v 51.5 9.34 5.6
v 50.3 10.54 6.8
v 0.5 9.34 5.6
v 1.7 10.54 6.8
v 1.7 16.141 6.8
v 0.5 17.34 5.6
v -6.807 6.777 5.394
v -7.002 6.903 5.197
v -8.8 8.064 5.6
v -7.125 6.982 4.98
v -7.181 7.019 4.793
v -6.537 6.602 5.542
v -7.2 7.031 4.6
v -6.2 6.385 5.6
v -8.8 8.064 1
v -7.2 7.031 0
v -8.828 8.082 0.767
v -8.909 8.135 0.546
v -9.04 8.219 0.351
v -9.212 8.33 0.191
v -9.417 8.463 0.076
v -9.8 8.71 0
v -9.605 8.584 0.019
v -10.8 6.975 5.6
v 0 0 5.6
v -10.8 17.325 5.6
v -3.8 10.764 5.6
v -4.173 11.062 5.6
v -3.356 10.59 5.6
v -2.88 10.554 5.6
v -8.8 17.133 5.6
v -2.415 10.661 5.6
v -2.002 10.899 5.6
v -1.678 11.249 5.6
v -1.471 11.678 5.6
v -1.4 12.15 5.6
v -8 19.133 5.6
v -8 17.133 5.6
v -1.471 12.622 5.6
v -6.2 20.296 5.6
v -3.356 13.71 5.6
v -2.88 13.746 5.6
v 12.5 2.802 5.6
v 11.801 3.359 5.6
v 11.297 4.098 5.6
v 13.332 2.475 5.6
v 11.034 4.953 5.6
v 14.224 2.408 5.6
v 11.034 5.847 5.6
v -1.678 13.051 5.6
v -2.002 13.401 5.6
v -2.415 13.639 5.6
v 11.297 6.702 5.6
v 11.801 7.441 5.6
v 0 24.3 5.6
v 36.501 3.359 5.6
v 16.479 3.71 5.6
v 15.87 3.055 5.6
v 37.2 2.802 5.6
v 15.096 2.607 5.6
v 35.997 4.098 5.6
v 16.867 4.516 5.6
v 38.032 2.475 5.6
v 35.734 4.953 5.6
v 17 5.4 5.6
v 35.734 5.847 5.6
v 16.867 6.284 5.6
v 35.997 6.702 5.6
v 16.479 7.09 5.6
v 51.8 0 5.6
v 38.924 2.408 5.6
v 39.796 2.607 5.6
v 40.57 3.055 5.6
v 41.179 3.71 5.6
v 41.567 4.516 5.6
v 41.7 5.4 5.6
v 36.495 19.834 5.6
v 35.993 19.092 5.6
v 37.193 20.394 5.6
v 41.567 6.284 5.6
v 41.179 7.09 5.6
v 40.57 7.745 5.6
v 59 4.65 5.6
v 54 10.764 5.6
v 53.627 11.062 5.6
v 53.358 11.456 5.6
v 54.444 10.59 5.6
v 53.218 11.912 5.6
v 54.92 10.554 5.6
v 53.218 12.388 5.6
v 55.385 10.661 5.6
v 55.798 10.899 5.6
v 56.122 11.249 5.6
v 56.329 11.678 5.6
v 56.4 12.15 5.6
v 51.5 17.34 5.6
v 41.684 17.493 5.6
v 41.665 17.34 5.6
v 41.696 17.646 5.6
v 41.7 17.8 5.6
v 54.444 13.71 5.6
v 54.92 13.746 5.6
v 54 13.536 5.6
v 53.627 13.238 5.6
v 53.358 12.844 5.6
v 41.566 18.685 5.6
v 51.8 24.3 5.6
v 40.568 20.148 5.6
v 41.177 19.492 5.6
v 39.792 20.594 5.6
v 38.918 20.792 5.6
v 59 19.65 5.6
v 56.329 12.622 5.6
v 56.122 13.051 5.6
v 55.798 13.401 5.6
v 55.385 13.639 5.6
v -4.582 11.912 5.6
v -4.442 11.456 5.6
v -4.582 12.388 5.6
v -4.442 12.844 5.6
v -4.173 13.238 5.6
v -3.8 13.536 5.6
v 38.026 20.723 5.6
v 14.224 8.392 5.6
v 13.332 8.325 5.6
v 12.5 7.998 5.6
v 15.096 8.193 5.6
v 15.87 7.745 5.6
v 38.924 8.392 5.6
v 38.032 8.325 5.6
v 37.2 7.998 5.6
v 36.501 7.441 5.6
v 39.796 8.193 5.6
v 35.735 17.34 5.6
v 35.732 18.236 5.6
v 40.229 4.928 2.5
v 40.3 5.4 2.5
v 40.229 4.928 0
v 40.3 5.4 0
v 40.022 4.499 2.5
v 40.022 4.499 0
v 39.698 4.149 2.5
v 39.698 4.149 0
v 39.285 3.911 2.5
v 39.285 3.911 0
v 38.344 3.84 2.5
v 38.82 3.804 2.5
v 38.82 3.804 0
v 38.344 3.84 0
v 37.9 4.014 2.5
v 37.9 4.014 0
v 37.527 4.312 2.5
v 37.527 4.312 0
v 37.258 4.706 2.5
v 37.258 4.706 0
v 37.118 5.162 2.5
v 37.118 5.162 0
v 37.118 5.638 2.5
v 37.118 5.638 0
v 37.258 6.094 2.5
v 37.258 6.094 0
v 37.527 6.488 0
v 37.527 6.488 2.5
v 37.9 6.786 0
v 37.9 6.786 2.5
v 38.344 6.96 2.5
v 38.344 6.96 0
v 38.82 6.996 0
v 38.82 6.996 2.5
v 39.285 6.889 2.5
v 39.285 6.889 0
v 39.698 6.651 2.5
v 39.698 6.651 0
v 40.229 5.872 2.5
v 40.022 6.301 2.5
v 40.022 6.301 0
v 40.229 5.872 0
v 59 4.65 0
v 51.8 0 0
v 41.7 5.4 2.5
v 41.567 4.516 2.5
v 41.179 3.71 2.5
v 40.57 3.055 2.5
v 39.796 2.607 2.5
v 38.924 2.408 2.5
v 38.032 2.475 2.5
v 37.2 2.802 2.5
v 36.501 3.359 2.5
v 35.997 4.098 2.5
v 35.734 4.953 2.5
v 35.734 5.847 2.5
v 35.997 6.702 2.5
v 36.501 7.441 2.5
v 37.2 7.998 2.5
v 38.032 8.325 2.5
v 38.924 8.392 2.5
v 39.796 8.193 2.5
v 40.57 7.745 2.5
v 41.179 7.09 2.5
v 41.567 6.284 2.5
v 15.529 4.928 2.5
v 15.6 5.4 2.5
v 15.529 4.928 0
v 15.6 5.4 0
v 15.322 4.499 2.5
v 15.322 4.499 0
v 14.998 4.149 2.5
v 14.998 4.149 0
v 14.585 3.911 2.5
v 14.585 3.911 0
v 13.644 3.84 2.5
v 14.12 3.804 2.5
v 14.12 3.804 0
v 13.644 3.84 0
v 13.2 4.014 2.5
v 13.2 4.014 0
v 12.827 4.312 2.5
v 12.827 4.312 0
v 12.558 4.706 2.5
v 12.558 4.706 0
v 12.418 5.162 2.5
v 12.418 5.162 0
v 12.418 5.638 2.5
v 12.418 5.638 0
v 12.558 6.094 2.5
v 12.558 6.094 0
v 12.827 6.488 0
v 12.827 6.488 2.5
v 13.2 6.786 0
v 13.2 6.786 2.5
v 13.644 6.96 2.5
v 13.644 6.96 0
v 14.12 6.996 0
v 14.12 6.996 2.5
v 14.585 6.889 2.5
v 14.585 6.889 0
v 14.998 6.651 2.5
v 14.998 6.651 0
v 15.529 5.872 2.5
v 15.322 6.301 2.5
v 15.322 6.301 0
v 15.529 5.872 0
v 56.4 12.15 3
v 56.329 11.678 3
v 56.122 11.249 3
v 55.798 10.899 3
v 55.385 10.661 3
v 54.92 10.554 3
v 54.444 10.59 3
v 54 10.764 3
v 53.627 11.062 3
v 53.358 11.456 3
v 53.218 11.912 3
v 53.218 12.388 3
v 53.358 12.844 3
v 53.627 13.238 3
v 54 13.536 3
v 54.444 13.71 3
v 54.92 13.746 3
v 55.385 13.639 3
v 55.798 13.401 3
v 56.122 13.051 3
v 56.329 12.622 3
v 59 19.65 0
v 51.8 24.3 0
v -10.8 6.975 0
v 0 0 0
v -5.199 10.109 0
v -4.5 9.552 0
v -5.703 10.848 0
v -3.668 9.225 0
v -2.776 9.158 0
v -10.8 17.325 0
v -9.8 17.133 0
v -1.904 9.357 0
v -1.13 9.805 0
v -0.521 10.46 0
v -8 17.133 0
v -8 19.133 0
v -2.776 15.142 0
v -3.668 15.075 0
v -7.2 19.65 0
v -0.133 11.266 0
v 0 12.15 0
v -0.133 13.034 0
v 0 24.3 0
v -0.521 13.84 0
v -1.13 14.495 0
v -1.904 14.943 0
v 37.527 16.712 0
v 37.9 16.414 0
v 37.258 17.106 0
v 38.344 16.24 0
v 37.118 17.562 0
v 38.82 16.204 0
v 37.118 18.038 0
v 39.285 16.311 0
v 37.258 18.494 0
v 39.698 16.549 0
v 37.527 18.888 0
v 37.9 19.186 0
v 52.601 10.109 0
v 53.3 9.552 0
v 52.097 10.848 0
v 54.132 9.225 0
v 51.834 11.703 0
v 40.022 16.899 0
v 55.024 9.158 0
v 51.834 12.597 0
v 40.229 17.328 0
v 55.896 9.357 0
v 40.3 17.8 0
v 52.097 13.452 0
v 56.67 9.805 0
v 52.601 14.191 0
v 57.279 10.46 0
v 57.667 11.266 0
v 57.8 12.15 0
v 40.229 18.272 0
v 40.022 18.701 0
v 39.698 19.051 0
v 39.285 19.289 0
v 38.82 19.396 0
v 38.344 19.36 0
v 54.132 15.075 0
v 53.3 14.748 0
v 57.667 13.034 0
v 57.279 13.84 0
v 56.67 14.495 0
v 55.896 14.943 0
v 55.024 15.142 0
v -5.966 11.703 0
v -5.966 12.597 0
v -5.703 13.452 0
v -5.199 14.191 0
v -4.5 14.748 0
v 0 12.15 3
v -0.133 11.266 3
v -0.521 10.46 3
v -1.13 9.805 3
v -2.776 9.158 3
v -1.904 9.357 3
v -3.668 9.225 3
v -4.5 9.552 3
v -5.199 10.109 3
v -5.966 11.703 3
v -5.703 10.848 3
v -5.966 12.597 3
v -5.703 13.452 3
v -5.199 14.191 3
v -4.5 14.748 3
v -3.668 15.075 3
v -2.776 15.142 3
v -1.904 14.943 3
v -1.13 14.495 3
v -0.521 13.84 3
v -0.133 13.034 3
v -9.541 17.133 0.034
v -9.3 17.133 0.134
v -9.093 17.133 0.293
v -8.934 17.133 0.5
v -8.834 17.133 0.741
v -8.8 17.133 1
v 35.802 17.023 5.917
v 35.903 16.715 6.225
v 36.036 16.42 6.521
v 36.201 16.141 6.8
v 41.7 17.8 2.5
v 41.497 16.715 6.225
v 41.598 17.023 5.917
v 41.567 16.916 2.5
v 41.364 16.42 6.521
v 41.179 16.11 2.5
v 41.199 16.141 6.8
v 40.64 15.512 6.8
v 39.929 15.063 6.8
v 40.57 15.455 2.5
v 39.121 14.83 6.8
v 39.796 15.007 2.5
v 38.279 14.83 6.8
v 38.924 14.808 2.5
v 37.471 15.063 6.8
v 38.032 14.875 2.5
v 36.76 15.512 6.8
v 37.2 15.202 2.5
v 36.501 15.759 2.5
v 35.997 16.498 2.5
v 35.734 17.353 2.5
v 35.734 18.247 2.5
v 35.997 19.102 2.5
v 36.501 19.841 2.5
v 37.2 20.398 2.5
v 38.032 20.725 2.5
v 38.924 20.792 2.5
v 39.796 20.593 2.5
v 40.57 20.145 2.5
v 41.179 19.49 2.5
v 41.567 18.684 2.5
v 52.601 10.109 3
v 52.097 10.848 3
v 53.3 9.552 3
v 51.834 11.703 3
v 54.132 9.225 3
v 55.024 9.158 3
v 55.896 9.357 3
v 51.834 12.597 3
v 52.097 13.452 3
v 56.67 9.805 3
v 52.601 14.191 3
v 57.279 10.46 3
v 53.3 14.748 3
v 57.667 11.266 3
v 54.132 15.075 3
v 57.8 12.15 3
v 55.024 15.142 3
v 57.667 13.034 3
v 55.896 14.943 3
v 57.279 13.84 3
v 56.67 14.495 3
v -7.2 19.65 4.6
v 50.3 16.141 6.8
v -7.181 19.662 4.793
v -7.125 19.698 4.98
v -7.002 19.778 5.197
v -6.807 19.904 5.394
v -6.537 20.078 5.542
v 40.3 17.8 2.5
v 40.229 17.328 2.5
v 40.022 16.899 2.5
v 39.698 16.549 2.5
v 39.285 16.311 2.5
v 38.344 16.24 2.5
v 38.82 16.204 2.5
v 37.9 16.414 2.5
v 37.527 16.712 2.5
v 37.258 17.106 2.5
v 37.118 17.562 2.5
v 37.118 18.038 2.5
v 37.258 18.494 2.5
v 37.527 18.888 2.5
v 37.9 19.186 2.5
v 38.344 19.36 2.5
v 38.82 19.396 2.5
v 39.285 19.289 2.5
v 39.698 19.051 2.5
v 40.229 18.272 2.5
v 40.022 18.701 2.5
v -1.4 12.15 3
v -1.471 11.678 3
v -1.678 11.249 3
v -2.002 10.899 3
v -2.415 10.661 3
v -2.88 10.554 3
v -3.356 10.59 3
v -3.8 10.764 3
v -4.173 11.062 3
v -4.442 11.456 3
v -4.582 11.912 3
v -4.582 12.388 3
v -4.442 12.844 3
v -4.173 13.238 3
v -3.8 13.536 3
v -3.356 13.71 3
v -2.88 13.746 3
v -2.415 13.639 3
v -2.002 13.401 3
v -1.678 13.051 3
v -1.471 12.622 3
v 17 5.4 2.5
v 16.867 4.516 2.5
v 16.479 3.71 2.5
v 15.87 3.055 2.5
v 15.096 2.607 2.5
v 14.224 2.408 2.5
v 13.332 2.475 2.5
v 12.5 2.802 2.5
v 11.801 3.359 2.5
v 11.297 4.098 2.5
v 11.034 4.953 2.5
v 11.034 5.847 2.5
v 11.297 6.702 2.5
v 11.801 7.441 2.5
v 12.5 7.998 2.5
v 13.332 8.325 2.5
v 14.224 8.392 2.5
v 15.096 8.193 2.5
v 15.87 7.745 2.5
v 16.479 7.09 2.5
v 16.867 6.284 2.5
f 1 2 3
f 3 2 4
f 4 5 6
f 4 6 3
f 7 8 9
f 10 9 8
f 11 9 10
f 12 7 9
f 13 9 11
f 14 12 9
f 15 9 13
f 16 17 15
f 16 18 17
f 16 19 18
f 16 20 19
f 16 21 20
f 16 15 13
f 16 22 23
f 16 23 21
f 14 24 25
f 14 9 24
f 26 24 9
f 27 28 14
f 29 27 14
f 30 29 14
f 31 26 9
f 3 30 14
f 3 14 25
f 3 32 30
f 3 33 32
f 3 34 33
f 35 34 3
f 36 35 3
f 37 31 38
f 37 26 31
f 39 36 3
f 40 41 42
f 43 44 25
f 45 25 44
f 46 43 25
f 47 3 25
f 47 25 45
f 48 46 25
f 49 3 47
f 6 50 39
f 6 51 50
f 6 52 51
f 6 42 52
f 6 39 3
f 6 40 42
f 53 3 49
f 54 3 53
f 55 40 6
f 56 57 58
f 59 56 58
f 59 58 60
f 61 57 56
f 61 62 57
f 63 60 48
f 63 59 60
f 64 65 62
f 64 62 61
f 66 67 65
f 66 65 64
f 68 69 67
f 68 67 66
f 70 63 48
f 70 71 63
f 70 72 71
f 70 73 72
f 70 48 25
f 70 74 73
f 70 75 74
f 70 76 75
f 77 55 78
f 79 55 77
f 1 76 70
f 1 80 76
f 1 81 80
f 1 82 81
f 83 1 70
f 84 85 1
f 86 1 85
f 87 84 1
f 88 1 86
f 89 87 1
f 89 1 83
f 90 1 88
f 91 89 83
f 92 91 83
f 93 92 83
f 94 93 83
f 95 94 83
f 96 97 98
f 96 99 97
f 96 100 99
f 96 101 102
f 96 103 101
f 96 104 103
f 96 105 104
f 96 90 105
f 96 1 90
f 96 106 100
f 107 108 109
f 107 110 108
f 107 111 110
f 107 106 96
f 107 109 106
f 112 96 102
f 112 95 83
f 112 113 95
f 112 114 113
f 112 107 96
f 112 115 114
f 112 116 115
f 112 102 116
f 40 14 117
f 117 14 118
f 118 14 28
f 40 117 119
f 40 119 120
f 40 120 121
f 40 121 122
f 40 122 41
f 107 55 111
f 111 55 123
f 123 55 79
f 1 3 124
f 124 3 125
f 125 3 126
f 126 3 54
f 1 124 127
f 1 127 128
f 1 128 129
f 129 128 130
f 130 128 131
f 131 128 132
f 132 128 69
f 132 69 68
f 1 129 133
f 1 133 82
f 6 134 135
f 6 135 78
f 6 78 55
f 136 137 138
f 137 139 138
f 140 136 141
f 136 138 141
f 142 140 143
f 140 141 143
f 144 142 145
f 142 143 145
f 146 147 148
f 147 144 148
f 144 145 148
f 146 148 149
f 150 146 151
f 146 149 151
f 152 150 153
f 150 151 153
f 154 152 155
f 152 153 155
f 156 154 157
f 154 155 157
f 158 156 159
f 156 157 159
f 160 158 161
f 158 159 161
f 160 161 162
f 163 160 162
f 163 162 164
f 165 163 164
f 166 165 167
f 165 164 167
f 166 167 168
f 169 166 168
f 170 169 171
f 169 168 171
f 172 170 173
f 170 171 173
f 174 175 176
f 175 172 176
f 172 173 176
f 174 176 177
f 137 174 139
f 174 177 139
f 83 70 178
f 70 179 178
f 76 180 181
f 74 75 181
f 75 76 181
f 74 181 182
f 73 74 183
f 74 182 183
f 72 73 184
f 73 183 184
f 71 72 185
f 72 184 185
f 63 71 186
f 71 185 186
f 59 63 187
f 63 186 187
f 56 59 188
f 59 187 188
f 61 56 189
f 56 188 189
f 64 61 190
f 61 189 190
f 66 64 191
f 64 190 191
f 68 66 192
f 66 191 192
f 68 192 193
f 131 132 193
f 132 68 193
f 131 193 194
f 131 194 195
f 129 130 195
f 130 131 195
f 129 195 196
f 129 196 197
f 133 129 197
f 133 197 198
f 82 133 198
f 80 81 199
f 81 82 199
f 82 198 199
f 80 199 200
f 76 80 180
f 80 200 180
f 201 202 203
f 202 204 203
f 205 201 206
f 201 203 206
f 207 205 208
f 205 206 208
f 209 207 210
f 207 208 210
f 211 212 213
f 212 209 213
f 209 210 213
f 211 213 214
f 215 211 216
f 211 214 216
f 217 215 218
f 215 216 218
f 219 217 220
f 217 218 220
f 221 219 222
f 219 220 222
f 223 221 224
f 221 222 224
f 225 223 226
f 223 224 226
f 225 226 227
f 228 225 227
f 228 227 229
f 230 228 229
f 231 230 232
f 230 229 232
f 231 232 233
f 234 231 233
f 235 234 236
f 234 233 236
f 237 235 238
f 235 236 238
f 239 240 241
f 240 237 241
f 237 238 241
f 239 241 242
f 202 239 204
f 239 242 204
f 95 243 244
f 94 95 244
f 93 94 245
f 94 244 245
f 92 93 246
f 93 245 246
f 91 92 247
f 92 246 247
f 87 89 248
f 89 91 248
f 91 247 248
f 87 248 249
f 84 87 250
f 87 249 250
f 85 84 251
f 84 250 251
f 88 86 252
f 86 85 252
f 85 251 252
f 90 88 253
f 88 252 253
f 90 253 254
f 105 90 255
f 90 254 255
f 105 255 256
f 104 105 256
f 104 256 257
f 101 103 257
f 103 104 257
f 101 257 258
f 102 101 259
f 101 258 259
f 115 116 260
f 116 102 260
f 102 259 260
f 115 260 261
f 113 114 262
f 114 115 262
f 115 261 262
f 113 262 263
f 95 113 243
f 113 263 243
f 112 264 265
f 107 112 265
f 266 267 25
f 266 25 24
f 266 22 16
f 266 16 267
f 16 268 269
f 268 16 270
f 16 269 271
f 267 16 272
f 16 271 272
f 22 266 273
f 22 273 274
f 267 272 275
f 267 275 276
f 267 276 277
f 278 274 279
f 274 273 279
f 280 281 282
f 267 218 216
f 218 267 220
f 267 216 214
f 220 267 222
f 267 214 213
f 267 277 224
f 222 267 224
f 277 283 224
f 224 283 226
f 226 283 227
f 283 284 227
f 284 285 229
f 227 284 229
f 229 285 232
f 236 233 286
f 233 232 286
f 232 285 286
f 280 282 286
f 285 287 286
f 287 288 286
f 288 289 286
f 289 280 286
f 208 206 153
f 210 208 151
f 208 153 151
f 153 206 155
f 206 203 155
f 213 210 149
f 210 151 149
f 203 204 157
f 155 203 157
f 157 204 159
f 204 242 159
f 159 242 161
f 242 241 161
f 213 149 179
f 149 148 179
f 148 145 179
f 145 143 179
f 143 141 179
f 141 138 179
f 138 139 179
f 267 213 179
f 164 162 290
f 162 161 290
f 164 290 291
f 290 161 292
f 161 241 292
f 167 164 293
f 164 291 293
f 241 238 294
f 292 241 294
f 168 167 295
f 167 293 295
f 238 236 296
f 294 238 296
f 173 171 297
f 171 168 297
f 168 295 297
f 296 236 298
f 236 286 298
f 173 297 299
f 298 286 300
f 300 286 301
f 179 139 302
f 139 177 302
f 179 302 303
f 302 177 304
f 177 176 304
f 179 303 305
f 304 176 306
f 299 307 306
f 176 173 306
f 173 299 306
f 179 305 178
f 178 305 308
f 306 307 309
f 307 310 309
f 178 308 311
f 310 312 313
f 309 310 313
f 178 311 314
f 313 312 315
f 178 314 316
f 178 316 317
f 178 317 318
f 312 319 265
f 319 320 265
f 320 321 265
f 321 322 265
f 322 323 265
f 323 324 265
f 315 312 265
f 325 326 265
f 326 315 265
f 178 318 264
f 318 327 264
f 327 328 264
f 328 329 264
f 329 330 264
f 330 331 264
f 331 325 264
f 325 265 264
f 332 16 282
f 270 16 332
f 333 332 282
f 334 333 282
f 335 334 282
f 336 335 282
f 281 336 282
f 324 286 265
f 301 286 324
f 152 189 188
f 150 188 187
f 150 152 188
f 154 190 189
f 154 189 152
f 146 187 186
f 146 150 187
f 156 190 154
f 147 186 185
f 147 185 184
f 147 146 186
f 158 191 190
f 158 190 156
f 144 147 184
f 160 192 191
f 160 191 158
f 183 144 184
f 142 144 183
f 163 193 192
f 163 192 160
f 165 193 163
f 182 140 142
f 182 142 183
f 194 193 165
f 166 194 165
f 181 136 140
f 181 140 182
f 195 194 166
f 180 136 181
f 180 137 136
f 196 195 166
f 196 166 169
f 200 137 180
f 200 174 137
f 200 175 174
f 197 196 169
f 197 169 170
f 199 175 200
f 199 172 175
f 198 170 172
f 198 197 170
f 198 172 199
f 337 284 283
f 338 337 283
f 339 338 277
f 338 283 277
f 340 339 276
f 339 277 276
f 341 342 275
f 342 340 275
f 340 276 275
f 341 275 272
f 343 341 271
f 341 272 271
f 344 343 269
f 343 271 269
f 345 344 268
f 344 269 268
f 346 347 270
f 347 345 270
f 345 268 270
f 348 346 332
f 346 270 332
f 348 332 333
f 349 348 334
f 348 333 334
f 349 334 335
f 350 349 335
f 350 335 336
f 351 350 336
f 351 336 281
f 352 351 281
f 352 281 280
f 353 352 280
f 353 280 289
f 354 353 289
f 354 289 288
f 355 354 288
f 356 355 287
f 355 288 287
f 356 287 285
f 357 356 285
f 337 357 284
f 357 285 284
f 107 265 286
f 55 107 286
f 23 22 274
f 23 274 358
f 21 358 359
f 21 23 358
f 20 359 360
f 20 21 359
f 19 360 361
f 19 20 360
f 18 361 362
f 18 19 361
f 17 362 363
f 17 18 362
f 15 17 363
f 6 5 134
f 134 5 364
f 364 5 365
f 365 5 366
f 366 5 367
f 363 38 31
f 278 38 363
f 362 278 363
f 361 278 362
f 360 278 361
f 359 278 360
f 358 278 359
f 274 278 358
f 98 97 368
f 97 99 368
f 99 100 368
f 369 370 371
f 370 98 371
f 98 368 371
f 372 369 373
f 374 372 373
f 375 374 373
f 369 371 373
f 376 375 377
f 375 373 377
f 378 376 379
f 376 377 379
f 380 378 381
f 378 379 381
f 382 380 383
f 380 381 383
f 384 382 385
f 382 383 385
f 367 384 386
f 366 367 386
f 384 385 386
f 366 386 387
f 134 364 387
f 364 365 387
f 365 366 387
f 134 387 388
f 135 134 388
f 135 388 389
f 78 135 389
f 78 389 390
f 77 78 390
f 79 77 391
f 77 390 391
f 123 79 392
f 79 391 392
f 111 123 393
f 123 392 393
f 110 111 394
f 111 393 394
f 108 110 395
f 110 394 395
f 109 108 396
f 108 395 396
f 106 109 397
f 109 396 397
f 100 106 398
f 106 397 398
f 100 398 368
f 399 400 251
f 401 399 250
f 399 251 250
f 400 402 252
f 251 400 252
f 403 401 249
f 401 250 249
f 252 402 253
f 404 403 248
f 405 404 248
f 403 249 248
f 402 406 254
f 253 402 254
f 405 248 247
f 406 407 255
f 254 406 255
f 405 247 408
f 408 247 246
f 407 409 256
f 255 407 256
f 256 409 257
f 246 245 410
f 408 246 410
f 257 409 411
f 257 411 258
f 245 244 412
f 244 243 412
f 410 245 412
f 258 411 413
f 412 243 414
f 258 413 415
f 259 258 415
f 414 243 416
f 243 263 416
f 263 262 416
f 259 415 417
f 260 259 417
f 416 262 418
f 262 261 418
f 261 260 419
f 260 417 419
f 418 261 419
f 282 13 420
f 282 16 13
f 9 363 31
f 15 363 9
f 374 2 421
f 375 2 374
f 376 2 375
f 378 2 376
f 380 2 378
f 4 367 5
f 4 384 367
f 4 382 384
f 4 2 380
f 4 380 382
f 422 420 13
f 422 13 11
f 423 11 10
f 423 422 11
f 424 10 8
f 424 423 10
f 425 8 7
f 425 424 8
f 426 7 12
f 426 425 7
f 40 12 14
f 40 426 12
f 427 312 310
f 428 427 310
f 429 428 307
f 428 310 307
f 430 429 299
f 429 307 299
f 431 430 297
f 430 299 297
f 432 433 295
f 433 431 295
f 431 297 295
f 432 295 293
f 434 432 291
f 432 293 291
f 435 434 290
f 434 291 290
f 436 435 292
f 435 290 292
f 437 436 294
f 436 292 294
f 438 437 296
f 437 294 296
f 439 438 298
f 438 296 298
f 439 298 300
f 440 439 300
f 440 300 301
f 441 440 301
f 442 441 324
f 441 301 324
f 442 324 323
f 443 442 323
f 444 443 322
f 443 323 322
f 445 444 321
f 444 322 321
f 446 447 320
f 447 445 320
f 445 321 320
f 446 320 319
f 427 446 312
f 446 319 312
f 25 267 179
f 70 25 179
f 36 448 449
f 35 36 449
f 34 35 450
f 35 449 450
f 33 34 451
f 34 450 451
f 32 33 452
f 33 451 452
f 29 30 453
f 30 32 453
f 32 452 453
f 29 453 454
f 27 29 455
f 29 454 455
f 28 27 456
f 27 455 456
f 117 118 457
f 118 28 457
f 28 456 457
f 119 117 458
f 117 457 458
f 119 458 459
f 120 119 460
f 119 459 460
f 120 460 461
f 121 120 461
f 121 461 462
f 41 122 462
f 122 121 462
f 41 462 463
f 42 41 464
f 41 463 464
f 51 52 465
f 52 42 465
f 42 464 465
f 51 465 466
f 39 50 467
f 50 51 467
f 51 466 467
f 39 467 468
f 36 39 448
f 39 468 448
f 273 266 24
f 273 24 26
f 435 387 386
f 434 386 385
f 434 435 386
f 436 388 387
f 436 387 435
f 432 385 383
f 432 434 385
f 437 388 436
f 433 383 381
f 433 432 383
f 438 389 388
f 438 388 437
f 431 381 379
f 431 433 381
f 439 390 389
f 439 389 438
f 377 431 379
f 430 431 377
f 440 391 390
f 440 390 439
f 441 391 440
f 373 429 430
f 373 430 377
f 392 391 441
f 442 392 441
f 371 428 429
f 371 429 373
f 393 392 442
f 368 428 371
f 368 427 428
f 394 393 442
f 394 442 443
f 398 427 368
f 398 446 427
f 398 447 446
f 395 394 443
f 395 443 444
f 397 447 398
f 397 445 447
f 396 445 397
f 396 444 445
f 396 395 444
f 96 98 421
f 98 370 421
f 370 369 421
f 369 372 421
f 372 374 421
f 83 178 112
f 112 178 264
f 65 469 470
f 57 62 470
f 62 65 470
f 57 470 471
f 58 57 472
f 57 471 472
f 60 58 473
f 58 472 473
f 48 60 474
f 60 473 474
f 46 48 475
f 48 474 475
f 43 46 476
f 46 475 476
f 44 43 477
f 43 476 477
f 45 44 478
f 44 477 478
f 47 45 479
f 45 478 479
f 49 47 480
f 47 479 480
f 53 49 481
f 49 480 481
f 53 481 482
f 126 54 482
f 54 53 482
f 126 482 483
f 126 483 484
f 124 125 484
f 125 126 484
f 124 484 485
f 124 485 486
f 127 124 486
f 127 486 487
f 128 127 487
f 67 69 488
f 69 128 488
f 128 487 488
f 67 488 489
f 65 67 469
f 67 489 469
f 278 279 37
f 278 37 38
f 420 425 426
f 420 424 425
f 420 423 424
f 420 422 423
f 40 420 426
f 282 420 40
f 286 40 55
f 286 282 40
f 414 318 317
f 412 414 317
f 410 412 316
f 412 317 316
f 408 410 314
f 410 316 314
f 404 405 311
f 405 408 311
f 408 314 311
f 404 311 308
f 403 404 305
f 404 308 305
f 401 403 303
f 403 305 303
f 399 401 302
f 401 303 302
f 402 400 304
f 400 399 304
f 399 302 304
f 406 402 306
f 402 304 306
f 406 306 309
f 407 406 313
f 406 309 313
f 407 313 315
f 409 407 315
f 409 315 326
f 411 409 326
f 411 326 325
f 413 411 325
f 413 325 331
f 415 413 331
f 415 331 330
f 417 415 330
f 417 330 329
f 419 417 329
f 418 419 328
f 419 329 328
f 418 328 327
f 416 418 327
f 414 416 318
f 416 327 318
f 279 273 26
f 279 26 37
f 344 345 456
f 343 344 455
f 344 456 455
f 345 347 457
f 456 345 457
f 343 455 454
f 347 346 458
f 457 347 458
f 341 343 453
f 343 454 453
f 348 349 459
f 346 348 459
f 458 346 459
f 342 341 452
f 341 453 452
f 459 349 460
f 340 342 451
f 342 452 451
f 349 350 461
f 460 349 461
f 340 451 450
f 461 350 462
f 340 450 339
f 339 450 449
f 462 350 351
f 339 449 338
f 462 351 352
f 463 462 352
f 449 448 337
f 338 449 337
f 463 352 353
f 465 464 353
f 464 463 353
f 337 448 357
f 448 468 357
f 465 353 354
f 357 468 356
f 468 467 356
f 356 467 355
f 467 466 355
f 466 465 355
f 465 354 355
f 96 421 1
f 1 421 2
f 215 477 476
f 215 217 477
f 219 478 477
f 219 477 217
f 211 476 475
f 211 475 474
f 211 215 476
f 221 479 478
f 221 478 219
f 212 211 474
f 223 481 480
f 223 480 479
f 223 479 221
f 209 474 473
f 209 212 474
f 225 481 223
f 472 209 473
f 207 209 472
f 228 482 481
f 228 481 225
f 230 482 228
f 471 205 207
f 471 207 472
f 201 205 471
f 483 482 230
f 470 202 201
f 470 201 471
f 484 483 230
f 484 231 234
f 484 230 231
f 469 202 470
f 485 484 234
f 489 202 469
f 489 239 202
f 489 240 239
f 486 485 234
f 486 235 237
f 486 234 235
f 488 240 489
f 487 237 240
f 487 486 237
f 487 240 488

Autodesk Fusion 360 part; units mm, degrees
sketch "Sketch1" plane through (0, 0, 0) normal (0, 0, 1) x (1, 0, 0)
  line L0 (0, 0) -> (51.8, 0)
  line L1 (51.8, 0) -> (51.8, 24.3)
  line L2 (51.8, 24.3) -> (0, 24.3)
  line L3 (0, 24.3) -> (0, 0)
  circle A0 centre (14, 5.4) radius 1.6
  circle A1 centre (38.7, 17.8) radius 1.6
  circle A2 centre (38.7, 5.4) radius 1.6
  line L4 (38.7, 17.8) -> (38.7, 5.4) construction
  line L5 (38.7, 5.4) -> (14, 5.4) construction
  line L6 (25.9, 24.3) -> (25.9, 0) construction
  circle A3 centre (38.7, 17.8) radius 3
  circle A4 centre (38.7, 5.4) radius 3
  circle A5 centre (14, 5.4) radius 3
  line L7 (51.8, 0) -> (59, 4.65)
  line L8 (59, 4.65) -> (59, 19.65)
  line L9 (59, 19.65) -> (51.8, 24.3)
  line L10 (0, 0) -> (-7.2, 4.65)
  line L11 (-7.2, 4.65) -> (-7.2, 19.65)
  line L12 (-7.2, 19.65) -> (0, 24.3)
  circle A6 centre (54.8, 12.15) radius 1.6
  circle A7 centre (-3, 12.15) radius 1.6
  line L13 (0, 12.15) -> (51.8, 12.15) construction
  circle A8 centre (-3, 12.15) radius 3
  circle A9 centre (54.8, 12.15) radius 3
  line L14 (-7.2, 4.65) -> (-10.8, 6.975)
  line L15 (-10.8, 6.975) -> (-10.8, 17.325)
  line L16 (-10.8, 17.325) -> (-8, 19.1333)
  line L17 (-8, 19.1333) -> (-8, 17.1333)
  line L18 (-8, 17.1333) -> (-8.8, 17.1333)
  line L19 (-8.8, 17.1333) -> (-8.8, 8.0642)
  line L20 (-8.8, 8.0642) -> (-7.2, 7.0308)
  dimension "d1" = 3.2
  dimension "d2" = 24.7
  dimension "d3" = 12.4
  dimension "d4" = 51.8
  dimension "d5" = 24.3
  dimension "d6" = 11.9
  dimension "d7" = 5.4
  dimension "d8" = 6
  dimension "d13" = 3.2
  dimension "d14" = 1.2
  dimension "d15" = 1.2
  dimension "d16" = 15
  dimension "d35" = 2
  dimension "d36" = 2
  dimension "d37" = 1.6
  dimension "d38" = 0.8
  dimension "d39" = 2
extrude "Extrude1" add sketch "Sketch1" along normal blind 5.6 contours L0 L1 L2 L3 | L3 L10 L11 L12 | L1 L7 L8 L9 | L11 L14 L15 L16 L17 L18 L19 L20
extrude "Extrude2" add sketch "Sketch1" along normal blind 2.5 contours A3 | A4 | A5
extrude "Extrude3" add sketch "Sketch1" along normal blind 2.6 from surface at 3 contours A8 | A9
sketch "Sketch2" plane through (0, 0, 5.6) normal (0, 0, 1) x (-1, 0, 0)
  circle A0 centre (-14, -5.4) radius 3
  circle A1 centre (-38.7, -17.8) radius 3
  circle A2 centre (-38.7, -5.4) radius 3
  line L0 (0, 0) -> (-51.8, 0)
  line L1 (-51.8, -24.3) -> (0, -24.3)
  line L2 (0, -24.3) -> (7.2, -19.65)
  line L3 (7.2, -19.65) -> (7.2, -7.0308)
  line L4 (10.8, -6.975) -> (0, 0)
  line L5 (-59.2, -13.3404) -> (7.2, -13.3404) construction
  line L6 (-59.2, -17.3404) -> (7.2, -17.3404)
  line L7 (7.2, -9.3404) -> (-59.2, -9.3404)
  line L8 (-51.5, -9.3404) -> (-51.5, -17.3404)
  line L9 (-0.5, -9.3404) -> (-0.5, -17.3404)
  line L10 (7.2, -7.0308) -> (8.8, -8.0642)
  line L11 (8.8, -8.0642) -> (8.8, -17.1333)
  line L12 (8.8, -17.1333) -> (8, -17.1333)
  line L13 (8, -17.1333) -> (8, -19.1333)
  line L14 (8, -19.1333) -> (10.8, -17.325)
  line L15 (10.8, -17.325) -> (10.8, -6.975)
  line L16 (-51.8, 0) -> (-59, -4.65)
  line L17 (-59, -4.65) -> (-59, -19.65)
  line L18 (-59, -19.65) -> (-51.8, -24.3)
  circle A3 centre (-54.8, -12.15) radius 1.6
  circle A4 centre (3, -12.15) radius 1.6
  dimension "d20" = 8
extrude "Extrude4" add sketch "Sketch2" along normal blind 1.2 contours A1 L6 L7 L8 L9
chamfer "Chamfer1" distance 1.2 angle 45 5 edges at (18.1177, 17.3404, 6.8) (26, 9.3404, 6.8) (46.5823, 17.3404, 6.8) (51.5, 13.3404, 6.8) (0.5, 13.3404, 6.8)
fillet "Fillet1" radius 1 2 edges at (-8.8, 12.5988, 0) (-7.2, 13.3404, 5.6)
equation "d7 = 4.2 mm + 1.2 mm"
equation "d15 = d14"
equation "d36 = d35"
equation "d39 = d35"
